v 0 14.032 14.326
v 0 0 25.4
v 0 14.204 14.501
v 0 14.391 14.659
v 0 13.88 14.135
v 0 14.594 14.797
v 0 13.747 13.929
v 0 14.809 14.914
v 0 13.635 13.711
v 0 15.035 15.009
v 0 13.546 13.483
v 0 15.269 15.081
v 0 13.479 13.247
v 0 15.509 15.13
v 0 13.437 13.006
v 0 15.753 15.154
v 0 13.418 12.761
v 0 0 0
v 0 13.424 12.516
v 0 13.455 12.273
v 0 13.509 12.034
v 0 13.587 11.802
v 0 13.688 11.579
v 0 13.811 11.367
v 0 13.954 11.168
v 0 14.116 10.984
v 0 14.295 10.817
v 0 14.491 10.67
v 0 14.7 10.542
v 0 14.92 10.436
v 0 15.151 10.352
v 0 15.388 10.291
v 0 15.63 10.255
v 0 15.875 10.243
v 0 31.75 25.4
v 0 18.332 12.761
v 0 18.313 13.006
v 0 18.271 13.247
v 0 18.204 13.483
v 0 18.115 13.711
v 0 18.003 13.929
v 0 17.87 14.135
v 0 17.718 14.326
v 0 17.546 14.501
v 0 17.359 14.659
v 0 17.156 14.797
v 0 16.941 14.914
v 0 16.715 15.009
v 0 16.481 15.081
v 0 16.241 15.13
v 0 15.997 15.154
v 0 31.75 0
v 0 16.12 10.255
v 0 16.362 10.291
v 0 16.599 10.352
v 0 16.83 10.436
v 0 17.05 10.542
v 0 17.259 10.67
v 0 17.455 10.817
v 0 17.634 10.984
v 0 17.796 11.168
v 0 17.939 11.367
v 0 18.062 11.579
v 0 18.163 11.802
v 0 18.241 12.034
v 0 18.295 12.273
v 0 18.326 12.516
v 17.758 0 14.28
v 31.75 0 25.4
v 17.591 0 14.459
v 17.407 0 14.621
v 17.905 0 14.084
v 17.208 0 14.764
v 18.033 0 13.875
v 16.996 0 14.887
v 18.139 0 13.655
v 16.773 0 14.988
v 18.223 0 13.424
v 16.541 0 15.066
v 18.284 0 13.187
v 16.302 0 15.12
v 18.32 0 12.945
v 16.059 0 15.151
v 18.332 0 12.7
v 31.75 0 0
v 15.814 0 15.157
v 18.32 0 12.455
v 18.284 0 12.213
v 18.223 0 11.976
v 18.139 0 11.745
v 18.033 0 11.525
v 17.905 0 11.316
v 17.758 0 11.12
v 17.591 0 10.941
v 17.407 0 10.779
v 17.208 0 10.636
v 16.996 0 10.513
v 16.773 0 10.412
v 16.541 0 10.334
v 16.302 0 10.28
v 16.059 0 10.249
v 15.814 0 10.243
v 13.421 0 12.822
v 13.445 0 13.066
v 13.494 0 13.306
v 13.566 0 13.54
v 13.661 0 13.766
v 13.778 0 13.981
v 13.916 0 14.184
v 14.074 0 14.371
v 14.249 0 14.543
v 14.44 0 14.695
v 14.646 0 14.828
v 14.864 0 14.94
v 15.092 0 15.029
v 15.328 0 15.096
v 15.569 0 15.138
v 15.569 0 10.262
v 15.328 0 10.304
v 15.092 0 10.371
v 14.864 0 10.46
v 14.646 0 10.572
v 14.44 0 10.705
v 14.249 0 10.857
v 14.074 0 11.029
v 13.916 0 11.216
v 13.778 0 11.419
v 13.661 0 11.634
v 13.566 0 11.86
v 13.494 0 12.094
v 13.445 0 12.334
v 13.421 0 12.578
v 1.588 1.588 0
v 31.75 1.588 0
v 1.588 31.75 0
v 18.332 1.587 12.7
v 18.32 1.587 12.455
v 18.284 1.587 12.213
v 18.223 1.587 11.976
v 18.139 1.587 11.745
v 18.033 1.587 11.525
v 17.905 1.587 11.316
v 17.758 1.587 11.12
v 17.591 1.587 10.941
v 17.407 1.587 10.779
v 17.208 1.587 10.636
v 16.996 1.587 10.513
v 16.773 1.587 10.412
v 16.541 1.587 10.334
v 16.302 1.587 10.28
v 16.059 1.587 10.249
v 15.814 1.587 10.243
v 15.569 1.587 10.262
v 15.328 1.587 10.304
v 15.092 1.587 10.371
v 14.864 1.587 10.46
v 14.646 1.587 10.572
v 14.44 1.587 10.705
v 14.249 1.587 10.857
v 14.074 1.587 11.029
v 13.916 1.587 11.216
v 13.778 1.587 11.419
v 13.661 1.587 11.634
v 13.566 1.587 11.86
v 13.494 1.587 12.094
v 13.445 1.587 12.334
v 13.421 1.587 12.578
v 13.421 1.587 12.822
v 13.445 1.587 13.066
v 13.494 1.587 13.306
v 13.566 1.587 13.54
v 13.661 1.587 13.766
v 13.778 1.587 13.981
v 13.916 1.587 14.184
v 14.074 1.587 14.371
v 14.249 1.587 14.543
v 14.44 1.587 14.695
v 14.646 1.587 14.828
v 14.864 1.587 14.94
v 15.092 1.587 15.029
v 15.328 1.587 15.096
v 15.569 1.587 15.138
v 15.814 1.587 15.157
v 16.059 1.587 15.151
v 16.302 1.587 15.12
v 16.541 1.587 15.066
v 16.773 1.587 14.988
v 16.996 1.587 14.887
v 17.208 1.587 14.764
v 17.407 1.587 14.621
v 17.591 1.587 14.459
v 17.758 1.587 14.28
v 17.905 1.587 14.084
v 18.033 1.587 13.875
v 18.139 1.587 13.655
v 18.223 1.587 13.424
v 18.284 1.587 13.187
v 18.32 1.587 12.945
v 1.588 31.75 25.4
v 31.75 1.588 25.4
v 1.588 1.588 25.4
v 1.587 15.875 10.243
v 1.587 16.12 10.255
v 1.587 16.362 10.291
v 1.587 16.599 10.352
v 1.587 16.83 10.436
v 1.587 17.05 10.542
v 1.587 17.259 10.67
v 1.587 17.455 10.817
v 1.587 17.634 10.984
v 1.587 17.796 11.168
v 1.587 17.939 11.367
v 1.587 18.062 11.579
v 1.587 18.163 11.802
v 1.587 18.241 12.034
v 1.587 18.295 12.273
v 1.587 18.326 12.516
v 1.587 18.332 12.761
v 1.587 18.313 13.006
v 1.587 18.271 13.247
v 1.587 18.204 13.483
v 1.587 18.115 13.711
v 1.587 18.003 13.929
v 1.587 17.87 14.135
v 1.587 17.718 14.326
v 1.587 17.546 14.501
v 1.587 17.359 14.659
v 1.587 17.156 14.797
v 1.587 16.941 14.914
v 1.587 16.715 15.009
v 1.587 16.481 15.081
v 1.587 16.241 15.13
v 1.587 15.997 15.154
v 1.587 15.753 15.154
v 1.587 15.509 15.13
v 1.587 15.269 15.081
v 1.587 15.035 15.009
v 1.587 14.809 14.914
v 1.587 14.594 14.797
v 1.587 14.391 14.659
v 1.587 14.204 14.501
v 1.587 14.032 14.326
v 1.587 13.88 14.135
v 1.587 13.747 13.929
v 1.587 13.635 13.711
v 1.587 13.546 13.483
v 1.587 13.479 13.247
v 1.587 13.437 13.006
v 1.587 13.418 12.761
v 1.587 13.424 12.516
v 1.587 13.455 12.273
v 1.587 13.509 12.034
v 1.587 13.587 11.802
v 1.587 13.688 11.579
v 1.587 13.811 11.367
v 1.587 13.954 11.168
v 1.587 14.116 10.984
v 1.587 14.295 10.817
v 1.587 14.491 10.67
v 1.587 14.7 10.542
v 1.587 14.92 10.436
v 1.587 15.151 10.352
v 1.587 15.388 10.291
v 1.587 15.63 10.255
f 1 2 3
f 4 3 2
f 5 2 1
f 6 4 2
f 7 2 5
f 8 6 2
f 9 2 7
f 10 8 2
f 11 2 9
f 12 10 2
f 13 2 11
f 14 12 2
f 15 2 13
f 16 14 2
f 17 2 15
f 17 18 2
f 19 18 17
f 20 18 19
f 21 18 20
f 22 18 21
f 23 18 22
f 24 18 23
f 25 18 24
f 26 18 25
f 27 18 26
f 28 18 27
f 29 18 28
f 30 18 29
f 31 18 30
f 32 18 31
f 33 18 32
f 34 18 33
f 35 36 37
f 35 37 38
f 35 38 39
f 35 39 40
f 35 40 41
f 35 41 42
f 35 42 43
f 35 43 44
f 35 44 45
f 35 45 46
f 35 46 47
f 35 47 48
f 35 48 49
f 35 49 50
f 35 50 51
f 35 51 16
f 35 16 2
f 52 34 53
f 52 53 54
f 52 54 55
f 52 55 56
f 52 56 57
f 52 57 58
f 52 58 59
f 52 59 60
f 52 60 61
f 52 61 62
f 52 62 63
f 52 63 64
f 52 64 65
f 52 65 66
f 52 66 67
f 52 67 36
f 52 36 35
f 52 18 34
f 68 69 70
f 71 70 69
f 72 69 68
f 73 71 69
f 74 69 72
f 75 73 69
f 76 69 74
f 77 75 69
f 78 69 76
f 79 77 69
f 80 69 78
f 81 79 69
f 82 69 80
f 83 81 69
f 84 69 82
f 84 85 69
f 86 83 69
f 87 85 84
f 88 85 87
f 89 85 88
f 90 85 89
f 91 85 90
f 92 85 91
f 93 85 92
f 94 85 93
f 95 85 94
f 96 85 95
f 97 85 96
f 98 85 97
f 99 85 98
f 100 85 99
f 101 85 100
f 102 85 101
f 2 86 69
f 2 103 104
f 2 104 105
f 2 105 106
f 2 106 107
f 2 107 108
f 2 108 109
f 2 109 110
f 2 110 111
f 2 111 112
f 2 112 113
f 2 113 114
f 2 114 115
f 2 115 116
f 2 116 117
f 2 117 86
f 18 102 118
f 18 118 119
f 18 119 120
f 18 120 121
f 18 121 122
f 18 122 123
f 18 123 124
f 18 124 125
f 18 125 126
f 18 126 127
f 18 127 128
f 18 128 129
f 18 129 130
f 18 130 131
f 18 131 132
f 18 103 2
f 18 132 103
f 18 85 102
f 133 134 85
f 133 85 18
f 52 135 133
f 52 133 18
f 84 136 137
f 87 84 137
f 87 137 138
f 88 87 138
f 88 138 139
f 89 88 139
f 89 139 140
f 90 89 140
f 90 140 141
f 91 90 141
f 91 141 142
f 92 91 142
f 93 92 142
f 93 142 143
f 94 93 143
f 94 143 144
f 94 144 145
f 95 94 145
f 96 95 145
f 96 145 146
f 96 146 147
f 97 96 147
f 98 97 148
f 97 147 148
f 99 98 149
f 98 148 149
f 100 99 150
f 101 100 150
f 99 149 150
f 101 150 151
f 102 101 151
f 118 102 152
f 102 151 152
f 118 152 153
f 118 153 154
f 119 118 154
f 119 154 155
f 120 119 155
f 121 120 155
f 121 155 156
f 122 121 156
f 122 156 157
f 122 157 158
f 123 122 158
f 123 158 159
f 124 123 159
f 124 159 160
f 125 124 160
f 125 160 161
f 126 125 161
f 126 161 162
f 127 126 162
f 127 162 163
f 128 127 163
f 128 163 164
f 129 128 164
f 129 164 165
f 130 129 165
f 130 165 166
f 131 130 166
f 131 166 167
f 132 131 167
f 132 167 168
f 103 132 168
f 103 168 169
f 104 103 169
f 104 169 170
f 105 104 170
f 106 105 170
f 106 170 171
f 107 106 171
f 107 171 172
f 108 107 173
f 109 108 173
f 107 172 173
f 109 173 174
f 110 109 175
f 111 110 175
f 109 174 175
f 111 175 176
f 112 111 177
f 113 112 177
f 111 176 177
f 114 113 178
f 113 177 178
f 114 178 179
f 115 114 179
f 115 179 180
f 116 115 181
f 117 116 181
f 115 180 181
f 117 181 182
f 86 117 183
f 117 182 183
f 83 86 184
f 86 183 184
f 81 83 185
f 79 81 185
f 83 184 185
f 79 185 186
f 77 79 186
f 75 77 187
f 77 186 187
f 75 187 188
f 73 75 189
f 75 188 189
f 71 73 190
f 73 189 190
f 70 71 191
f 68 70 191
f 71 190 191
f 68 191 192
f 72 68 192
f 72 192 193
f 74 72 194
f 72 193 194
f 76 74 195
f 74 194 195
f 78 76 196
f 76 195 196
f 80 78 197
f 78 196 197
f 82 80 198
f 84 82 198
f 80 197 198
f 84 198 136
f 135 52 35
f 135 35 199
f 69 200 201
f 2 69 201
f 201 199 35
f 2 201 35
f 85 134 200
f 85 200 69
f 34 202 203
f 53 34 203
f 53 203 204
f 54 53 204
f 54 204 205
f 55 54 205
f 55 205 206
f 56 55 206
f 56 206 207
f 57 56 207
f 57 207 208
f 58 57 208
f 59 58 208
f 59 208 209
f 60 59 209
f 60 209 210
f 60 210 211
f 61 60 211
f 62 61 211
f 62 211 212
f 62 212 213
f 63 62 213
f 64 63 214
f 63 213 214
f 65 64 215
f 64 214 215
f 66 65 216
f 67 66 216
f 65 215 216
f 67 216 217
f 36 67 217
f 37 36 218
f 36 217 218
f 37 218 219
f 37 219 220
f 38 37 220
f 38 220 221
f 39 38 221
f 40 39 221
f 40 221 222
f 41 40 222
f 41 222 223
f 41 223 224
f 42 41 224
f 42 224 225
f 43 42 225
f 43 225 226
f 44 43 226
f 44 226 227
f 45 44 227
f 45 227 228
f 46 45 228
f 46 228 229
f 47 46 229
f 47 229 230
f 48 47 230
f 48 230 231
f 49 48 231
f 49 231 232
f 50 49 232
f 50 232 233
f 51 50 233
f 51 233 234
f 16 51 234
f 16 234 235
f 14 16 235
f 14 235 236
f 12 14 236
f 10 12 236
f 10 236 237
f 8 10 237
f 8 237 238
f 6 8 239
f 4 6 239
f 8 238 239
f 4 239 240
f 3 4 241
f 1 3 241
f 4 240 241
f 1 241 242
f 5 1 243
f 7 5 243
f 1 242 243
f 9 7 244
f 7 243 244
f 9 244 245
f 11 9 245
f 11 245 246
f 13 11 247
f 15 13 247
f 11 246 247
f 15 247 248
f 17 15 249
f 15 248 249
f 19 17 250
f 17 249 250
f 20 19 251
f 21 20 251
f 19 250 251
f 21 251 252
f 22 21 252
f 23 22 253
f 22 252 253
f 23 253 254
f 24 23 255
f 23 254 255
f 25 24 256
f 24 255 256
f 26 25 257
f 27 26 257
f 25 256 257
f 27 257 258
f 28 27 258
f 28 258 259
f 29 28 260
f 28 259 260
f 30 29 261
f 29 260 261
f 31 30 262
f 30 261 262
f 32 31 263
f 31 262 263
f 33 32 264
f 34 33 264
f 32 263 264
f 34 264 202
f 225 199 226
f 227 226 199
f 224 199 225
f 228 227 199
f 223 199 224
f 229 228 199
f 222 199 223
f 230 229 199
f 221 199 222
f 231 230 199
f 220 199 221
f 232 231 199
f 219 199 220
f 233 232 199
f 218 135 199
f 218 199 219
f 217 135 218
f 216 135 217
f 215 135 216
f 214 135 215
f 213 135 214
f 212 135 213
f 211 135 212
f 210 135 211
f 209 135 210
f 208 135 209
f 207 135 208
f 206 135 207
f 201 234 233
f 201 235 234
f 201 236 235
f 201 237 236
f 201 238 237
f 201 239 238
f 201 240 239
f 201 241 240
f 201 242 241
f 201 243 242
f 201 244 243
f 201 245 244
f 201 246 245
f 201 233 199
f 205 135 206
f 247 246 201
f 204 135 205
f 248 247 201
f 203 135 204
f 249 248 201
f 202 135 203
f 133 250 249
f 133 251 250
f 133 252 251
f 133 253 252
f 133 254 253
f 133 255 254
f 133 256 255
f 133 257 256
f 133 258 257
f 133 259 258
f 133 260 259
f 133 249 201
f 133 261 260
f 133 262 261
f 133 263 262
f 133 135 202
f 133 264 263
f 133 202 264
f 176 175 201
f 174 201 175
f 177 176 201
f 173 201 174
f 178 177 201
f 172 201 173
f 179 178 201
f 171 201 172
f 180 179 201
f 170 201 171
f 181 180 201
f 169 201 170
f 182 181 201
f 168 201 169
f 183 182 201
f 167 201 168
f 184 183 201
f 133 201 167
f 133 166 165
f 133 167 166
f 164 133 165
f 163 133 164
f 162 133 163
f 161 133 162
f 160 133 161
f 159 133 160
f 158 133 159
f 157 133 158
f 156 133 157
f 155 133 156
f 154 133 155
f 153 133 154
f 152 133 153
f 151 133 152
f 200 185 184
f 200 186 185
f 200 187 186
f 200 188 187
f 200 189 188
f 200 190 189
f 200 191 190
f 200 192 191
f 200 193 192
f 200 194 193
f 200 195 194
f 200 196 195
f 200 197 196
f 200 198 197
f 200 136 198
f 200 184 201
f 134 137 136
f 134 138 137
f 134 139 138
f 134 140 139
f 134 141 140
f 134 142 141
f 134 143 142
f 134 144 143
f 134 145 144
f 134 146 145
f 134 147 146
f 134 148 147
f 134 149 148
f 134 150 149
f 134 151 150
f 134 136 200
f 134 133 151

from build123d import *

# Parameters (mm, degrees)
BOSS_EXTRUDE1_DEPTH          = 25.4
F_10_0_1935_DIAMETER_HOLE1_D = 4.9149
F_10_0_1935_DIAMETER_HOLE2_D = 4.9149


with BuildPart() as part:
    # Sketch1 → Boss-Extrude1 (new body)
    with BuildSketch(Plane.XY):
        Polygon((0, 0), (0, 31.75), (1.5875, 31.75), (1.5875, 1.5875), (31.75, 1.5875), (31.75, 0), align=None)
    extrude(amount=BOSS_EXTRUDE1_DEPTH)

    # #10 (0.1935) Diameter Hole1 (through all)
    with Locations(Plane(origin=(0, 0, 0), x_dir=(-1, 0, 0), z_dir=(0, -1, 0))):
        with Locations((-15.875, -12.7)):
            Hole(F_10_0_1935_DIAMETER_HOLE1_D / 2)

    # #10 (0.1935) Diameter Hole2 (through all)
    with Locations(Plane.ZY):
        with Locations((12.7, 15.875)):
            Hole(F_10_0_1935_DIAMETER_HOLE2_D / 2)


solid = part.part
